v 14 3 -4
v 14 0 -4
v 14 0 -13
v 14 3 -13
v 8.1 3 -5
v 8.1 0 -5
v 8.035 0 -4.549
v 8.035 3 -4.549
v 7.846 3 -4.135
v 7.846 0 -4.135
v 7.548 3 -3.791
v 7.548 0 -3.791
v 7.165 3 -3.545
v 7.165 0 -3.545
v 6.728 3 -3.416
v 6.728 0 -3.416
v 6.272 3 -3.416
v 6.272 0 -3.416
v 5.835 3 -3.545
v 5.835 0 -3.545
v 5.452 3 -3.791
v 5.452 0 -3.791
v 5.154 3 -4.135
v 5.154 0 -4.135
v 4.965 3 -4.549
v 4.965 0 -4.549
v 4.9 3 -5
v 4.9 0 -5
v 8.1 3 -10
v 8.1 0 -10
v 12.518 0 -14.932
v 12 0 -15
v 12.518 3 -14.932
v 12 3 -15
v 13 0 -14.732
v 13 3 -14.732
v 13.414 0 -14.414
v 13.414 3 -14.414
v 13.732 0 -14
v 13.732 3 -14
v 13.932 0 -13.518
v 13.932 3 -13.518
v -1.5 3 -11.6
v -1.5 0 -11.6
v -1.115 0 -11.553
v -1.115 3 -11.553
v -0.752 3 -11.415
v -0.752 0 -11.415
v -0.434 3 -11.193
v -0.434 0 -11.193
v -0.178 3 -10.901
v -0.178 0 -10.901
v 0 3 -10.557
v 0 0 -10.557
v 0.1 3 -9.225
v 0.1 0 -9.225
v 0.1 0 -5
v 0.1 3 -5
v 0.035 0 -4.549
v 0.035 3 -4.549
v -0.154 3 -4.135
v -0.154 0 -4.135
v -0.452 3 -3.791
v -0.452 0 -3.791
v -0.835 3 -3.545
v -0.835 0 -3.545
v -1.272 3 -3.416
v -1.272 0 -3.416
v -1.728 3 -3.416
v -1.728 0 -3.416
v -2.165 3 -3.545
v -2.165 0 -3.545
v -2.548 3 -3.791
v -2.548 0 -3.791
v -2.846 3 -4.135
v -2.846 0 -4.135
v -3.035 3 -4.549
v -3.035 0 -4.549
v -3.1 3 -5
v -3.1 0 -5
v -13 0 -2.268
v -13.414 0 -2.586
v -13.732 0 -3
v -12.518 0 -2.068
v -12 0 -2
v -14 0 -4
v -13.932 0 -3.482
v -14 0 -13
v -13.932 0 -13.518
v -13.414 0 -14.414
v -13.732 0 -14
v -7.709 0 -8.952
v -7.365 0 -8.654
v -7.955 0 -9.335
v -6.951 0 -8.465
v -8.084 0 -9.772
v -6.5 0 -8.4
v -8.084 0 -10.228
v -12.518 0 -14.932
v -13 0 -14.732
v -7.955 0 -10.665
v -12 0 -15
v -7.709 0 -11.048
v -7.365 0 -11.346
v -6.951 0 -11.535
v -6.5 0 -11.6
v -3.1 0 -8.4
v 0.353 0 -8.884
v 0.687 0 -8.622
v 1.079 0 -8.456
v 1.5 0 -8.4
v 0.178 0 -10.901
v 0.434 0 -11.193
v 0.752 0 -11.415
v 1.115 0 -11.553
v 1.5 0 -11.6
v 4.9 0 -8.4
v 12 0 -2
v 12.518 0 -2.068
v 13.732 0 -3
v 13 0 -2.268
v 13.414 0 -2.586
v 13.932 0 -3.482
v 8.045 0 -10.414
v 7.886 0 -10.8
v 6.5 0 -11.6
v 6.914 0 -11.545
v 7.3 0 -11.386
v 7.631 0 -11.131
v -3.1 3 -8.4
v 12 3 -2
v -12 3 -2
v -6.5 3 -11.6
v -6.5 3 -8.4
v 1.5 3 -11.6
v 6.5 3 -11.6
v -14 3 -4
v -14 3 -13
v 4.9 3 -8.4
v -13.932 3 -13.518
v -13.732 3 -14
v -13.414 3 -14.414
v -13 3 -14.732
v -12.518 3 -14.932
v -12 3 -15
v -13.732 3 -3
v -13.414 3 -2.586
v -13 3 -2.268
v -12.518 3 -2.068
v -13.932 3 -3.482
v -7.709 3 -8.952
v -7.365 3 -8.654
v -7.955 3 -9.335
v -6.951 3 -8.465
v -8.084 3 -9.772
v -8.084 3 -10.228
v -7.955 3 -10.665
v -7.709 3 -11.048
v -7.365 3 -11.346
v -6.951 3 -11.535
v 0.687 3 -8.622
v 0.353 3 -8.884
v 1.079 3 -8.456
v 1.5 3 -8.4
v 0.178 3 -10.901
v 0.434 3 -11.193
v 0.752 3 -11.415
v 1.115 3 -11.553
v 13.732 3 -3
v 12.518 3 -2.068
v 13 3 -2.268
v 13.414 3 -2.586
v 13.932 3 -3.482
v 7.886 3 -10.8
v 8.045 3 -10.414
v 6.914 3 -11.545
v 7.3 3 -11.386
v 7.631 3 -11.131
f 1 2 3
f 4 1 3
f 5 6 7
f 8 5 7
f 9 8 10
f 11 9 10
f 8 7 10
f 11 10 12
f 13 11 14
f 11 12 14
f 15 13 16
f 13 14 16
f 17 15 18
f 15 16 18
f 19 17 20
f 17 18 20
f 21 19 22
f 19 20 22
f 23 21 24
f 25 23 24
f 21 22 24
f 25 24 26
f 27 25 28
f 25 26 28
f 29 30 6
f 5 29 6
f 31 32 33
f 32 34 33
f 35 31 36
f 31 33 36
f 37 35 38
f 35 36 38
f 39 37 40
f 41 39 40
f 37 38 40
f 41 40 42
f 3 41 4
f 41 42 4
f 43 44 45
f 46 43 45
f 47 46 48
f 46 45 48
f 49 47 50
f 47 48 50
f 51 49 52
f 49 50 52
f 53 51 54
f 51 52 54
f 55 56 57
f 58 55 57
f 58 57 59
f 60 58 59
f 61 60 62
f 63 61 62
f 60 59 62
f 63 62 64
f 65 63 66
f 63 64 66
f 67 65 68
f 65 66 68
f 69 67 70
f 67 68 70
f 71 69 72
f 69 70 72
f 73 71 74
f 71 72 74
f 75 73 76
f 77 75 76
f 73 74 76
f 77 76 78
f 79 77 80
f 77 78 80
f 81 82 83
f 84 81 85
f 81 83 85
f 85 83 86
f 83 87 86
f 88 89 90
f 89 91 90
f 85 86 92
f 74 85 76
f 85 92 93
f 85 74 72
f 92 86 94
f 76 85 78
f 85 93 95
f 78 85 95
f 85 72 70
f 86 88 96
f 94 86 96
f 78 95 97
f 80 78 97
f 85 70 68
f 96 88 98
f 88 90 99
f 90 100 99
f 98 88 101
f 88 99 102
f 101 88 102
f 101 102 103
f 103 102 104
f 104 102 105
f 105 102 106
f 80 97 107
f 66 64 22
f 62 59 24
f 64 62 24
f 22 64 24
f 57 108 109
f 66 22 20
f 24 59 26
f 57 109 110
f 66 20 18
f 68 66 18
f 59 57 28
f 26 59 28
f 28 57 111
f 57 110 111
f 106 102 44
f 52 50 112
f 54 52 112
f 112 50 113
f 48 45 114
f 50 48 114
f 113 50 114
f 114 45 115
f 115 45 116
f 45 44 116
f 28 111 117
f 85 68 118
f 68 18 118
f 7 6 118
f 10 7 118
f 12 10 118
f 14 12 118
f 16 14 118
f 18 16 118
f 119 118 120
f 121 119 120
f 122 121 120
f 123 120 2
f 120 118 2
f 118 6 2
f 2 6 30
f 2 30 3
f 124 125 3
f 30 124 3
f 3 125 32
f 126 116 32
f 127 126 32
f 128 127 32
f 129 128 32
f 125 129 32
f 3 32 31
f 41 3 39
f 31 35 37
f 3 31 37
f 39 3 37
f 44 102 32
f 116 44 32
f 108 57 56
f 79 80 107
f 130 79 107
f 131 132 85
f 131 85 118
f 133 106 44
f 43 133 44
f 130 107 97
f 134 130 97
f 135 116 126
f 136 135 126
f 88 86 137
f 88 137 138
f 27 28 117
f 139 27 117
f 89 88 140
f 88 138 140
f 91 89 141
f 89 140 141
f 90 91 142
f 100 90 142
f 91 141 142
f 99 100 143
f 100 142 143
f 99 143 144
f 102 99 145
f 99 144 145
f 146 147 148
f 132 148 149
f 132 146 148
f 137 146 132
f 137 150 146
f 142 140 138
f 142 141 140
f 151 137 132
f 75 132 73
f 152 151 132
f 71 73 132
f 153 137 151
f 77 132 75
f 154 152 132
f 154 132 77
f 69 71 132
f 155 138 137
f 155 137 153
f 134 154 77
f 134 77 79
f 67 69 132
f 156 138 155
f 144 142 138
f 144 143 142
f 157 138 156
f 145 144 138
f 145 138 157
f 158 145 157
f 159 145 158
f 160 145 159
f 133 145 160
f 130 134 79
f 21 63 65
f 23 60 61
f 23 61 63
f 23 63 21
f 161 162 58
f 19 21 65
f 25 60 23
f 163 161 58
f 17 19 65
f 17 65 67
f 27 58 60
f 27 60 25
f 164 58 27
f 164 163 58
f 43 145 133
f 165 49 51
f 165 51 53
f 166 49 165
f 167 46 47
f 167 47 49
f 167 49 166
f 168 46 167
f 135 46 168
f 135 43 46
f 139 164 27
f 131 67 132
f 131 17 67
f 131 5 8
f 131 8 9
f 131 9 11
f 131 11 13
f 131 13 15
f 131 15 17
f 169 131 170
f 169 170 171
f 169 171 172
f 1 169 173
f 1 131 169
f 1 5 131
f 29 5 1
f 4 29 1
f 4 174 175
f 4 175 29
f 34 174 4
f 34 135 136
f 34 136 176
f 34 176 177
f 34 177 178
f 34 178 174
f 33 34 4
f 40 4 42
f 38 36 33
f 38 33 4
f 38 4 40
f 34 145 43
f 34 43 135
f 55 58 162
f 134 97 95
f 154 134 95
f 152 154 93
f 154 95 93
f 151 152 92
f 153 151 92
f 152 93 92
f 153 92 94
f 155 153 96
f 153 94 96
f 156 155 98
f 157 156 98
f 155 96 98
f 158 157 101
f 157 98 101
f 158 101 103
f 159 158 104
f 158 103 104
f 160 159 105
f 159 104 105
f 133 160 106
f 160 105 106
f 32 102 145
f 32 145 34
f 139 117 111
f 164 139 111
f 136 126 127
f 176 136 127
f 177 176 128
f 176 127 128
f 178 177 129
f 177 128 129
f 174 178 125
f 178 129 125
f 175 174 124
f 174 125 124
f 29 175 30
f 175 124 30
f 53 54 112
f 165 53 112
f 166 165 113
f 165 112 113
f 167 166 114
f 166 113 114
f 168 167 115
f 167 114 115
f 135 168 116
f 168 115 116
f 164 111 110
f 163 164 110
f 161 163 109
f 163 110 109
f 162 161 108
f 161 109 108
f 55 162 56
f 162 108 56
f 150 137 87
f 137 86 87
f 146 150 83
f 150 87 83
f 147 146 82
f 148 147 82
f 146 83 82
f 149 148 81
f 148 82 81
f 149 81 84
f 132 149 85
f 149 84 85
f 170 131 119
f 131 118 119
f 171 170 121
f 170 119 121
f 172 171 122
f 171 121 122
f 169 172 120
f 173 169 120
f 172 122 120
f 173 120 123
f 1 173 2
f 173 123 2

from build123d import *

# Parameters (mm, degrees)
SKETCH1_W           = 28
SKETCH1_H           = 30
BOSS_EXTRUDE1_DEPTH = 3
SKETCH2_R           = 1.6
CUT_EXTRUDE1_DEPTH  = 4
SKETCH3_W           = 28
SKETCH3_H           = 17
CUT_EXTRUDE2_DEPTH  = 4
FILLET1_R           = 2


with BuildPart() as part:
    # Sketch1 → Boss-Extrude1 (new body)
    with BuildSketch(Plane(origin=(0, 0, 0), x_dir=(1, 0, 0), z_dir=(0, 1, 0))):
        Rectangle(SKETCH1_W, SKETCH1_H)
        with BuildLine():
            ThreePointArc((1.5, 8.4), (0.687397597, 8.621712173), (0.1, 9.225403331))
            Line((0.1, 9.225403331), (0.1, 5))
            ThreePointArc((0.1, 5), (-1.5, 3.4), (-3.1, 5))
            Line((-3.1, 5), (-3.1, 8.4))
            Line((-3.1, 8.4), (-6.5, 8.4))
            ThreePointArc((-6.5, 8.4), (-8.1, 10), (-6.5, 11.6))
            Line((-6.5, 11.6), (-1.5, 11.6))
            ThreePointArc((-1.5, 11.6), (-0.586447127, 11.313552873), (0, 10.556776436))
            ThreePointArc((0, 10.556776436), (0.586447127, 11.313552873), (1.5, 11.6))
            Line((1.5, 11.6), (6.5, 11.6))
            ThreePointArc((6.5, 11.6), (7.63137085, 11.13137085), (8.1, 10))
            Line((8.1, 10), (8.1, 5))
            ThreePointArc((8.1, 5), (6.5, 3.4), (4.9, 5))
            Line((4.9, 5), (4.9, 8.4))
            Line((4.9, 8.4), (1.5, 8.4))
        make_face(mode=Mode.SUBTRACT)
    extrude(amount=BOSS_EXTRUDE1_DEPTH)

    # Sketch2 → Cut-Extrude1 (cut, through all)
    with BuildSketch(Plane(origin=(0, 3, 0), x_dir=(1, 0, 0), z_dir=(0, 1, 0))):
        with Locations((-5.25, -10)):
            Circle(SKETCH2_R)
        with Locations((5.25, -10)):
            Circle(SKETCH2_R)
        Polygon((14, 0), (8.5, -15), (14, -15), align=None)
        Polygon((-8.5, -15), (-14, -15), (-14, 0), align=None)
    extrude(amount=-CUT_EXTRUDE1_DEPTH, mode=Mode.SUBTRACT)

    # Sketch3 → Cut-Extrude2 (cut, through all)
    with BuildSketch(Plane(origin=(0, 3, 0), x_dir=(1, 0, 0), z_dir=(0, 1, 0))):
        with Locations((0, -6.5)):
            Rectangle(SKETCH3_W, SKETCH3_H)
    extrude(amount=-CUT_EXTRUDE2_DEPTH, mode=Mode.SUBTRACT)

    # Fillet1
    fillet1_edges = [part.edges().sort_by_distance(p)[0] for p in [
        (-14, 1.5, -15),
        (14, 1.5, -15),
        (14, 1.5, -2),
        (-14, 1.5, -2),
    ]]
    fillet(fillet1_edges, radius=FILLET1_R)


solid = part.part
